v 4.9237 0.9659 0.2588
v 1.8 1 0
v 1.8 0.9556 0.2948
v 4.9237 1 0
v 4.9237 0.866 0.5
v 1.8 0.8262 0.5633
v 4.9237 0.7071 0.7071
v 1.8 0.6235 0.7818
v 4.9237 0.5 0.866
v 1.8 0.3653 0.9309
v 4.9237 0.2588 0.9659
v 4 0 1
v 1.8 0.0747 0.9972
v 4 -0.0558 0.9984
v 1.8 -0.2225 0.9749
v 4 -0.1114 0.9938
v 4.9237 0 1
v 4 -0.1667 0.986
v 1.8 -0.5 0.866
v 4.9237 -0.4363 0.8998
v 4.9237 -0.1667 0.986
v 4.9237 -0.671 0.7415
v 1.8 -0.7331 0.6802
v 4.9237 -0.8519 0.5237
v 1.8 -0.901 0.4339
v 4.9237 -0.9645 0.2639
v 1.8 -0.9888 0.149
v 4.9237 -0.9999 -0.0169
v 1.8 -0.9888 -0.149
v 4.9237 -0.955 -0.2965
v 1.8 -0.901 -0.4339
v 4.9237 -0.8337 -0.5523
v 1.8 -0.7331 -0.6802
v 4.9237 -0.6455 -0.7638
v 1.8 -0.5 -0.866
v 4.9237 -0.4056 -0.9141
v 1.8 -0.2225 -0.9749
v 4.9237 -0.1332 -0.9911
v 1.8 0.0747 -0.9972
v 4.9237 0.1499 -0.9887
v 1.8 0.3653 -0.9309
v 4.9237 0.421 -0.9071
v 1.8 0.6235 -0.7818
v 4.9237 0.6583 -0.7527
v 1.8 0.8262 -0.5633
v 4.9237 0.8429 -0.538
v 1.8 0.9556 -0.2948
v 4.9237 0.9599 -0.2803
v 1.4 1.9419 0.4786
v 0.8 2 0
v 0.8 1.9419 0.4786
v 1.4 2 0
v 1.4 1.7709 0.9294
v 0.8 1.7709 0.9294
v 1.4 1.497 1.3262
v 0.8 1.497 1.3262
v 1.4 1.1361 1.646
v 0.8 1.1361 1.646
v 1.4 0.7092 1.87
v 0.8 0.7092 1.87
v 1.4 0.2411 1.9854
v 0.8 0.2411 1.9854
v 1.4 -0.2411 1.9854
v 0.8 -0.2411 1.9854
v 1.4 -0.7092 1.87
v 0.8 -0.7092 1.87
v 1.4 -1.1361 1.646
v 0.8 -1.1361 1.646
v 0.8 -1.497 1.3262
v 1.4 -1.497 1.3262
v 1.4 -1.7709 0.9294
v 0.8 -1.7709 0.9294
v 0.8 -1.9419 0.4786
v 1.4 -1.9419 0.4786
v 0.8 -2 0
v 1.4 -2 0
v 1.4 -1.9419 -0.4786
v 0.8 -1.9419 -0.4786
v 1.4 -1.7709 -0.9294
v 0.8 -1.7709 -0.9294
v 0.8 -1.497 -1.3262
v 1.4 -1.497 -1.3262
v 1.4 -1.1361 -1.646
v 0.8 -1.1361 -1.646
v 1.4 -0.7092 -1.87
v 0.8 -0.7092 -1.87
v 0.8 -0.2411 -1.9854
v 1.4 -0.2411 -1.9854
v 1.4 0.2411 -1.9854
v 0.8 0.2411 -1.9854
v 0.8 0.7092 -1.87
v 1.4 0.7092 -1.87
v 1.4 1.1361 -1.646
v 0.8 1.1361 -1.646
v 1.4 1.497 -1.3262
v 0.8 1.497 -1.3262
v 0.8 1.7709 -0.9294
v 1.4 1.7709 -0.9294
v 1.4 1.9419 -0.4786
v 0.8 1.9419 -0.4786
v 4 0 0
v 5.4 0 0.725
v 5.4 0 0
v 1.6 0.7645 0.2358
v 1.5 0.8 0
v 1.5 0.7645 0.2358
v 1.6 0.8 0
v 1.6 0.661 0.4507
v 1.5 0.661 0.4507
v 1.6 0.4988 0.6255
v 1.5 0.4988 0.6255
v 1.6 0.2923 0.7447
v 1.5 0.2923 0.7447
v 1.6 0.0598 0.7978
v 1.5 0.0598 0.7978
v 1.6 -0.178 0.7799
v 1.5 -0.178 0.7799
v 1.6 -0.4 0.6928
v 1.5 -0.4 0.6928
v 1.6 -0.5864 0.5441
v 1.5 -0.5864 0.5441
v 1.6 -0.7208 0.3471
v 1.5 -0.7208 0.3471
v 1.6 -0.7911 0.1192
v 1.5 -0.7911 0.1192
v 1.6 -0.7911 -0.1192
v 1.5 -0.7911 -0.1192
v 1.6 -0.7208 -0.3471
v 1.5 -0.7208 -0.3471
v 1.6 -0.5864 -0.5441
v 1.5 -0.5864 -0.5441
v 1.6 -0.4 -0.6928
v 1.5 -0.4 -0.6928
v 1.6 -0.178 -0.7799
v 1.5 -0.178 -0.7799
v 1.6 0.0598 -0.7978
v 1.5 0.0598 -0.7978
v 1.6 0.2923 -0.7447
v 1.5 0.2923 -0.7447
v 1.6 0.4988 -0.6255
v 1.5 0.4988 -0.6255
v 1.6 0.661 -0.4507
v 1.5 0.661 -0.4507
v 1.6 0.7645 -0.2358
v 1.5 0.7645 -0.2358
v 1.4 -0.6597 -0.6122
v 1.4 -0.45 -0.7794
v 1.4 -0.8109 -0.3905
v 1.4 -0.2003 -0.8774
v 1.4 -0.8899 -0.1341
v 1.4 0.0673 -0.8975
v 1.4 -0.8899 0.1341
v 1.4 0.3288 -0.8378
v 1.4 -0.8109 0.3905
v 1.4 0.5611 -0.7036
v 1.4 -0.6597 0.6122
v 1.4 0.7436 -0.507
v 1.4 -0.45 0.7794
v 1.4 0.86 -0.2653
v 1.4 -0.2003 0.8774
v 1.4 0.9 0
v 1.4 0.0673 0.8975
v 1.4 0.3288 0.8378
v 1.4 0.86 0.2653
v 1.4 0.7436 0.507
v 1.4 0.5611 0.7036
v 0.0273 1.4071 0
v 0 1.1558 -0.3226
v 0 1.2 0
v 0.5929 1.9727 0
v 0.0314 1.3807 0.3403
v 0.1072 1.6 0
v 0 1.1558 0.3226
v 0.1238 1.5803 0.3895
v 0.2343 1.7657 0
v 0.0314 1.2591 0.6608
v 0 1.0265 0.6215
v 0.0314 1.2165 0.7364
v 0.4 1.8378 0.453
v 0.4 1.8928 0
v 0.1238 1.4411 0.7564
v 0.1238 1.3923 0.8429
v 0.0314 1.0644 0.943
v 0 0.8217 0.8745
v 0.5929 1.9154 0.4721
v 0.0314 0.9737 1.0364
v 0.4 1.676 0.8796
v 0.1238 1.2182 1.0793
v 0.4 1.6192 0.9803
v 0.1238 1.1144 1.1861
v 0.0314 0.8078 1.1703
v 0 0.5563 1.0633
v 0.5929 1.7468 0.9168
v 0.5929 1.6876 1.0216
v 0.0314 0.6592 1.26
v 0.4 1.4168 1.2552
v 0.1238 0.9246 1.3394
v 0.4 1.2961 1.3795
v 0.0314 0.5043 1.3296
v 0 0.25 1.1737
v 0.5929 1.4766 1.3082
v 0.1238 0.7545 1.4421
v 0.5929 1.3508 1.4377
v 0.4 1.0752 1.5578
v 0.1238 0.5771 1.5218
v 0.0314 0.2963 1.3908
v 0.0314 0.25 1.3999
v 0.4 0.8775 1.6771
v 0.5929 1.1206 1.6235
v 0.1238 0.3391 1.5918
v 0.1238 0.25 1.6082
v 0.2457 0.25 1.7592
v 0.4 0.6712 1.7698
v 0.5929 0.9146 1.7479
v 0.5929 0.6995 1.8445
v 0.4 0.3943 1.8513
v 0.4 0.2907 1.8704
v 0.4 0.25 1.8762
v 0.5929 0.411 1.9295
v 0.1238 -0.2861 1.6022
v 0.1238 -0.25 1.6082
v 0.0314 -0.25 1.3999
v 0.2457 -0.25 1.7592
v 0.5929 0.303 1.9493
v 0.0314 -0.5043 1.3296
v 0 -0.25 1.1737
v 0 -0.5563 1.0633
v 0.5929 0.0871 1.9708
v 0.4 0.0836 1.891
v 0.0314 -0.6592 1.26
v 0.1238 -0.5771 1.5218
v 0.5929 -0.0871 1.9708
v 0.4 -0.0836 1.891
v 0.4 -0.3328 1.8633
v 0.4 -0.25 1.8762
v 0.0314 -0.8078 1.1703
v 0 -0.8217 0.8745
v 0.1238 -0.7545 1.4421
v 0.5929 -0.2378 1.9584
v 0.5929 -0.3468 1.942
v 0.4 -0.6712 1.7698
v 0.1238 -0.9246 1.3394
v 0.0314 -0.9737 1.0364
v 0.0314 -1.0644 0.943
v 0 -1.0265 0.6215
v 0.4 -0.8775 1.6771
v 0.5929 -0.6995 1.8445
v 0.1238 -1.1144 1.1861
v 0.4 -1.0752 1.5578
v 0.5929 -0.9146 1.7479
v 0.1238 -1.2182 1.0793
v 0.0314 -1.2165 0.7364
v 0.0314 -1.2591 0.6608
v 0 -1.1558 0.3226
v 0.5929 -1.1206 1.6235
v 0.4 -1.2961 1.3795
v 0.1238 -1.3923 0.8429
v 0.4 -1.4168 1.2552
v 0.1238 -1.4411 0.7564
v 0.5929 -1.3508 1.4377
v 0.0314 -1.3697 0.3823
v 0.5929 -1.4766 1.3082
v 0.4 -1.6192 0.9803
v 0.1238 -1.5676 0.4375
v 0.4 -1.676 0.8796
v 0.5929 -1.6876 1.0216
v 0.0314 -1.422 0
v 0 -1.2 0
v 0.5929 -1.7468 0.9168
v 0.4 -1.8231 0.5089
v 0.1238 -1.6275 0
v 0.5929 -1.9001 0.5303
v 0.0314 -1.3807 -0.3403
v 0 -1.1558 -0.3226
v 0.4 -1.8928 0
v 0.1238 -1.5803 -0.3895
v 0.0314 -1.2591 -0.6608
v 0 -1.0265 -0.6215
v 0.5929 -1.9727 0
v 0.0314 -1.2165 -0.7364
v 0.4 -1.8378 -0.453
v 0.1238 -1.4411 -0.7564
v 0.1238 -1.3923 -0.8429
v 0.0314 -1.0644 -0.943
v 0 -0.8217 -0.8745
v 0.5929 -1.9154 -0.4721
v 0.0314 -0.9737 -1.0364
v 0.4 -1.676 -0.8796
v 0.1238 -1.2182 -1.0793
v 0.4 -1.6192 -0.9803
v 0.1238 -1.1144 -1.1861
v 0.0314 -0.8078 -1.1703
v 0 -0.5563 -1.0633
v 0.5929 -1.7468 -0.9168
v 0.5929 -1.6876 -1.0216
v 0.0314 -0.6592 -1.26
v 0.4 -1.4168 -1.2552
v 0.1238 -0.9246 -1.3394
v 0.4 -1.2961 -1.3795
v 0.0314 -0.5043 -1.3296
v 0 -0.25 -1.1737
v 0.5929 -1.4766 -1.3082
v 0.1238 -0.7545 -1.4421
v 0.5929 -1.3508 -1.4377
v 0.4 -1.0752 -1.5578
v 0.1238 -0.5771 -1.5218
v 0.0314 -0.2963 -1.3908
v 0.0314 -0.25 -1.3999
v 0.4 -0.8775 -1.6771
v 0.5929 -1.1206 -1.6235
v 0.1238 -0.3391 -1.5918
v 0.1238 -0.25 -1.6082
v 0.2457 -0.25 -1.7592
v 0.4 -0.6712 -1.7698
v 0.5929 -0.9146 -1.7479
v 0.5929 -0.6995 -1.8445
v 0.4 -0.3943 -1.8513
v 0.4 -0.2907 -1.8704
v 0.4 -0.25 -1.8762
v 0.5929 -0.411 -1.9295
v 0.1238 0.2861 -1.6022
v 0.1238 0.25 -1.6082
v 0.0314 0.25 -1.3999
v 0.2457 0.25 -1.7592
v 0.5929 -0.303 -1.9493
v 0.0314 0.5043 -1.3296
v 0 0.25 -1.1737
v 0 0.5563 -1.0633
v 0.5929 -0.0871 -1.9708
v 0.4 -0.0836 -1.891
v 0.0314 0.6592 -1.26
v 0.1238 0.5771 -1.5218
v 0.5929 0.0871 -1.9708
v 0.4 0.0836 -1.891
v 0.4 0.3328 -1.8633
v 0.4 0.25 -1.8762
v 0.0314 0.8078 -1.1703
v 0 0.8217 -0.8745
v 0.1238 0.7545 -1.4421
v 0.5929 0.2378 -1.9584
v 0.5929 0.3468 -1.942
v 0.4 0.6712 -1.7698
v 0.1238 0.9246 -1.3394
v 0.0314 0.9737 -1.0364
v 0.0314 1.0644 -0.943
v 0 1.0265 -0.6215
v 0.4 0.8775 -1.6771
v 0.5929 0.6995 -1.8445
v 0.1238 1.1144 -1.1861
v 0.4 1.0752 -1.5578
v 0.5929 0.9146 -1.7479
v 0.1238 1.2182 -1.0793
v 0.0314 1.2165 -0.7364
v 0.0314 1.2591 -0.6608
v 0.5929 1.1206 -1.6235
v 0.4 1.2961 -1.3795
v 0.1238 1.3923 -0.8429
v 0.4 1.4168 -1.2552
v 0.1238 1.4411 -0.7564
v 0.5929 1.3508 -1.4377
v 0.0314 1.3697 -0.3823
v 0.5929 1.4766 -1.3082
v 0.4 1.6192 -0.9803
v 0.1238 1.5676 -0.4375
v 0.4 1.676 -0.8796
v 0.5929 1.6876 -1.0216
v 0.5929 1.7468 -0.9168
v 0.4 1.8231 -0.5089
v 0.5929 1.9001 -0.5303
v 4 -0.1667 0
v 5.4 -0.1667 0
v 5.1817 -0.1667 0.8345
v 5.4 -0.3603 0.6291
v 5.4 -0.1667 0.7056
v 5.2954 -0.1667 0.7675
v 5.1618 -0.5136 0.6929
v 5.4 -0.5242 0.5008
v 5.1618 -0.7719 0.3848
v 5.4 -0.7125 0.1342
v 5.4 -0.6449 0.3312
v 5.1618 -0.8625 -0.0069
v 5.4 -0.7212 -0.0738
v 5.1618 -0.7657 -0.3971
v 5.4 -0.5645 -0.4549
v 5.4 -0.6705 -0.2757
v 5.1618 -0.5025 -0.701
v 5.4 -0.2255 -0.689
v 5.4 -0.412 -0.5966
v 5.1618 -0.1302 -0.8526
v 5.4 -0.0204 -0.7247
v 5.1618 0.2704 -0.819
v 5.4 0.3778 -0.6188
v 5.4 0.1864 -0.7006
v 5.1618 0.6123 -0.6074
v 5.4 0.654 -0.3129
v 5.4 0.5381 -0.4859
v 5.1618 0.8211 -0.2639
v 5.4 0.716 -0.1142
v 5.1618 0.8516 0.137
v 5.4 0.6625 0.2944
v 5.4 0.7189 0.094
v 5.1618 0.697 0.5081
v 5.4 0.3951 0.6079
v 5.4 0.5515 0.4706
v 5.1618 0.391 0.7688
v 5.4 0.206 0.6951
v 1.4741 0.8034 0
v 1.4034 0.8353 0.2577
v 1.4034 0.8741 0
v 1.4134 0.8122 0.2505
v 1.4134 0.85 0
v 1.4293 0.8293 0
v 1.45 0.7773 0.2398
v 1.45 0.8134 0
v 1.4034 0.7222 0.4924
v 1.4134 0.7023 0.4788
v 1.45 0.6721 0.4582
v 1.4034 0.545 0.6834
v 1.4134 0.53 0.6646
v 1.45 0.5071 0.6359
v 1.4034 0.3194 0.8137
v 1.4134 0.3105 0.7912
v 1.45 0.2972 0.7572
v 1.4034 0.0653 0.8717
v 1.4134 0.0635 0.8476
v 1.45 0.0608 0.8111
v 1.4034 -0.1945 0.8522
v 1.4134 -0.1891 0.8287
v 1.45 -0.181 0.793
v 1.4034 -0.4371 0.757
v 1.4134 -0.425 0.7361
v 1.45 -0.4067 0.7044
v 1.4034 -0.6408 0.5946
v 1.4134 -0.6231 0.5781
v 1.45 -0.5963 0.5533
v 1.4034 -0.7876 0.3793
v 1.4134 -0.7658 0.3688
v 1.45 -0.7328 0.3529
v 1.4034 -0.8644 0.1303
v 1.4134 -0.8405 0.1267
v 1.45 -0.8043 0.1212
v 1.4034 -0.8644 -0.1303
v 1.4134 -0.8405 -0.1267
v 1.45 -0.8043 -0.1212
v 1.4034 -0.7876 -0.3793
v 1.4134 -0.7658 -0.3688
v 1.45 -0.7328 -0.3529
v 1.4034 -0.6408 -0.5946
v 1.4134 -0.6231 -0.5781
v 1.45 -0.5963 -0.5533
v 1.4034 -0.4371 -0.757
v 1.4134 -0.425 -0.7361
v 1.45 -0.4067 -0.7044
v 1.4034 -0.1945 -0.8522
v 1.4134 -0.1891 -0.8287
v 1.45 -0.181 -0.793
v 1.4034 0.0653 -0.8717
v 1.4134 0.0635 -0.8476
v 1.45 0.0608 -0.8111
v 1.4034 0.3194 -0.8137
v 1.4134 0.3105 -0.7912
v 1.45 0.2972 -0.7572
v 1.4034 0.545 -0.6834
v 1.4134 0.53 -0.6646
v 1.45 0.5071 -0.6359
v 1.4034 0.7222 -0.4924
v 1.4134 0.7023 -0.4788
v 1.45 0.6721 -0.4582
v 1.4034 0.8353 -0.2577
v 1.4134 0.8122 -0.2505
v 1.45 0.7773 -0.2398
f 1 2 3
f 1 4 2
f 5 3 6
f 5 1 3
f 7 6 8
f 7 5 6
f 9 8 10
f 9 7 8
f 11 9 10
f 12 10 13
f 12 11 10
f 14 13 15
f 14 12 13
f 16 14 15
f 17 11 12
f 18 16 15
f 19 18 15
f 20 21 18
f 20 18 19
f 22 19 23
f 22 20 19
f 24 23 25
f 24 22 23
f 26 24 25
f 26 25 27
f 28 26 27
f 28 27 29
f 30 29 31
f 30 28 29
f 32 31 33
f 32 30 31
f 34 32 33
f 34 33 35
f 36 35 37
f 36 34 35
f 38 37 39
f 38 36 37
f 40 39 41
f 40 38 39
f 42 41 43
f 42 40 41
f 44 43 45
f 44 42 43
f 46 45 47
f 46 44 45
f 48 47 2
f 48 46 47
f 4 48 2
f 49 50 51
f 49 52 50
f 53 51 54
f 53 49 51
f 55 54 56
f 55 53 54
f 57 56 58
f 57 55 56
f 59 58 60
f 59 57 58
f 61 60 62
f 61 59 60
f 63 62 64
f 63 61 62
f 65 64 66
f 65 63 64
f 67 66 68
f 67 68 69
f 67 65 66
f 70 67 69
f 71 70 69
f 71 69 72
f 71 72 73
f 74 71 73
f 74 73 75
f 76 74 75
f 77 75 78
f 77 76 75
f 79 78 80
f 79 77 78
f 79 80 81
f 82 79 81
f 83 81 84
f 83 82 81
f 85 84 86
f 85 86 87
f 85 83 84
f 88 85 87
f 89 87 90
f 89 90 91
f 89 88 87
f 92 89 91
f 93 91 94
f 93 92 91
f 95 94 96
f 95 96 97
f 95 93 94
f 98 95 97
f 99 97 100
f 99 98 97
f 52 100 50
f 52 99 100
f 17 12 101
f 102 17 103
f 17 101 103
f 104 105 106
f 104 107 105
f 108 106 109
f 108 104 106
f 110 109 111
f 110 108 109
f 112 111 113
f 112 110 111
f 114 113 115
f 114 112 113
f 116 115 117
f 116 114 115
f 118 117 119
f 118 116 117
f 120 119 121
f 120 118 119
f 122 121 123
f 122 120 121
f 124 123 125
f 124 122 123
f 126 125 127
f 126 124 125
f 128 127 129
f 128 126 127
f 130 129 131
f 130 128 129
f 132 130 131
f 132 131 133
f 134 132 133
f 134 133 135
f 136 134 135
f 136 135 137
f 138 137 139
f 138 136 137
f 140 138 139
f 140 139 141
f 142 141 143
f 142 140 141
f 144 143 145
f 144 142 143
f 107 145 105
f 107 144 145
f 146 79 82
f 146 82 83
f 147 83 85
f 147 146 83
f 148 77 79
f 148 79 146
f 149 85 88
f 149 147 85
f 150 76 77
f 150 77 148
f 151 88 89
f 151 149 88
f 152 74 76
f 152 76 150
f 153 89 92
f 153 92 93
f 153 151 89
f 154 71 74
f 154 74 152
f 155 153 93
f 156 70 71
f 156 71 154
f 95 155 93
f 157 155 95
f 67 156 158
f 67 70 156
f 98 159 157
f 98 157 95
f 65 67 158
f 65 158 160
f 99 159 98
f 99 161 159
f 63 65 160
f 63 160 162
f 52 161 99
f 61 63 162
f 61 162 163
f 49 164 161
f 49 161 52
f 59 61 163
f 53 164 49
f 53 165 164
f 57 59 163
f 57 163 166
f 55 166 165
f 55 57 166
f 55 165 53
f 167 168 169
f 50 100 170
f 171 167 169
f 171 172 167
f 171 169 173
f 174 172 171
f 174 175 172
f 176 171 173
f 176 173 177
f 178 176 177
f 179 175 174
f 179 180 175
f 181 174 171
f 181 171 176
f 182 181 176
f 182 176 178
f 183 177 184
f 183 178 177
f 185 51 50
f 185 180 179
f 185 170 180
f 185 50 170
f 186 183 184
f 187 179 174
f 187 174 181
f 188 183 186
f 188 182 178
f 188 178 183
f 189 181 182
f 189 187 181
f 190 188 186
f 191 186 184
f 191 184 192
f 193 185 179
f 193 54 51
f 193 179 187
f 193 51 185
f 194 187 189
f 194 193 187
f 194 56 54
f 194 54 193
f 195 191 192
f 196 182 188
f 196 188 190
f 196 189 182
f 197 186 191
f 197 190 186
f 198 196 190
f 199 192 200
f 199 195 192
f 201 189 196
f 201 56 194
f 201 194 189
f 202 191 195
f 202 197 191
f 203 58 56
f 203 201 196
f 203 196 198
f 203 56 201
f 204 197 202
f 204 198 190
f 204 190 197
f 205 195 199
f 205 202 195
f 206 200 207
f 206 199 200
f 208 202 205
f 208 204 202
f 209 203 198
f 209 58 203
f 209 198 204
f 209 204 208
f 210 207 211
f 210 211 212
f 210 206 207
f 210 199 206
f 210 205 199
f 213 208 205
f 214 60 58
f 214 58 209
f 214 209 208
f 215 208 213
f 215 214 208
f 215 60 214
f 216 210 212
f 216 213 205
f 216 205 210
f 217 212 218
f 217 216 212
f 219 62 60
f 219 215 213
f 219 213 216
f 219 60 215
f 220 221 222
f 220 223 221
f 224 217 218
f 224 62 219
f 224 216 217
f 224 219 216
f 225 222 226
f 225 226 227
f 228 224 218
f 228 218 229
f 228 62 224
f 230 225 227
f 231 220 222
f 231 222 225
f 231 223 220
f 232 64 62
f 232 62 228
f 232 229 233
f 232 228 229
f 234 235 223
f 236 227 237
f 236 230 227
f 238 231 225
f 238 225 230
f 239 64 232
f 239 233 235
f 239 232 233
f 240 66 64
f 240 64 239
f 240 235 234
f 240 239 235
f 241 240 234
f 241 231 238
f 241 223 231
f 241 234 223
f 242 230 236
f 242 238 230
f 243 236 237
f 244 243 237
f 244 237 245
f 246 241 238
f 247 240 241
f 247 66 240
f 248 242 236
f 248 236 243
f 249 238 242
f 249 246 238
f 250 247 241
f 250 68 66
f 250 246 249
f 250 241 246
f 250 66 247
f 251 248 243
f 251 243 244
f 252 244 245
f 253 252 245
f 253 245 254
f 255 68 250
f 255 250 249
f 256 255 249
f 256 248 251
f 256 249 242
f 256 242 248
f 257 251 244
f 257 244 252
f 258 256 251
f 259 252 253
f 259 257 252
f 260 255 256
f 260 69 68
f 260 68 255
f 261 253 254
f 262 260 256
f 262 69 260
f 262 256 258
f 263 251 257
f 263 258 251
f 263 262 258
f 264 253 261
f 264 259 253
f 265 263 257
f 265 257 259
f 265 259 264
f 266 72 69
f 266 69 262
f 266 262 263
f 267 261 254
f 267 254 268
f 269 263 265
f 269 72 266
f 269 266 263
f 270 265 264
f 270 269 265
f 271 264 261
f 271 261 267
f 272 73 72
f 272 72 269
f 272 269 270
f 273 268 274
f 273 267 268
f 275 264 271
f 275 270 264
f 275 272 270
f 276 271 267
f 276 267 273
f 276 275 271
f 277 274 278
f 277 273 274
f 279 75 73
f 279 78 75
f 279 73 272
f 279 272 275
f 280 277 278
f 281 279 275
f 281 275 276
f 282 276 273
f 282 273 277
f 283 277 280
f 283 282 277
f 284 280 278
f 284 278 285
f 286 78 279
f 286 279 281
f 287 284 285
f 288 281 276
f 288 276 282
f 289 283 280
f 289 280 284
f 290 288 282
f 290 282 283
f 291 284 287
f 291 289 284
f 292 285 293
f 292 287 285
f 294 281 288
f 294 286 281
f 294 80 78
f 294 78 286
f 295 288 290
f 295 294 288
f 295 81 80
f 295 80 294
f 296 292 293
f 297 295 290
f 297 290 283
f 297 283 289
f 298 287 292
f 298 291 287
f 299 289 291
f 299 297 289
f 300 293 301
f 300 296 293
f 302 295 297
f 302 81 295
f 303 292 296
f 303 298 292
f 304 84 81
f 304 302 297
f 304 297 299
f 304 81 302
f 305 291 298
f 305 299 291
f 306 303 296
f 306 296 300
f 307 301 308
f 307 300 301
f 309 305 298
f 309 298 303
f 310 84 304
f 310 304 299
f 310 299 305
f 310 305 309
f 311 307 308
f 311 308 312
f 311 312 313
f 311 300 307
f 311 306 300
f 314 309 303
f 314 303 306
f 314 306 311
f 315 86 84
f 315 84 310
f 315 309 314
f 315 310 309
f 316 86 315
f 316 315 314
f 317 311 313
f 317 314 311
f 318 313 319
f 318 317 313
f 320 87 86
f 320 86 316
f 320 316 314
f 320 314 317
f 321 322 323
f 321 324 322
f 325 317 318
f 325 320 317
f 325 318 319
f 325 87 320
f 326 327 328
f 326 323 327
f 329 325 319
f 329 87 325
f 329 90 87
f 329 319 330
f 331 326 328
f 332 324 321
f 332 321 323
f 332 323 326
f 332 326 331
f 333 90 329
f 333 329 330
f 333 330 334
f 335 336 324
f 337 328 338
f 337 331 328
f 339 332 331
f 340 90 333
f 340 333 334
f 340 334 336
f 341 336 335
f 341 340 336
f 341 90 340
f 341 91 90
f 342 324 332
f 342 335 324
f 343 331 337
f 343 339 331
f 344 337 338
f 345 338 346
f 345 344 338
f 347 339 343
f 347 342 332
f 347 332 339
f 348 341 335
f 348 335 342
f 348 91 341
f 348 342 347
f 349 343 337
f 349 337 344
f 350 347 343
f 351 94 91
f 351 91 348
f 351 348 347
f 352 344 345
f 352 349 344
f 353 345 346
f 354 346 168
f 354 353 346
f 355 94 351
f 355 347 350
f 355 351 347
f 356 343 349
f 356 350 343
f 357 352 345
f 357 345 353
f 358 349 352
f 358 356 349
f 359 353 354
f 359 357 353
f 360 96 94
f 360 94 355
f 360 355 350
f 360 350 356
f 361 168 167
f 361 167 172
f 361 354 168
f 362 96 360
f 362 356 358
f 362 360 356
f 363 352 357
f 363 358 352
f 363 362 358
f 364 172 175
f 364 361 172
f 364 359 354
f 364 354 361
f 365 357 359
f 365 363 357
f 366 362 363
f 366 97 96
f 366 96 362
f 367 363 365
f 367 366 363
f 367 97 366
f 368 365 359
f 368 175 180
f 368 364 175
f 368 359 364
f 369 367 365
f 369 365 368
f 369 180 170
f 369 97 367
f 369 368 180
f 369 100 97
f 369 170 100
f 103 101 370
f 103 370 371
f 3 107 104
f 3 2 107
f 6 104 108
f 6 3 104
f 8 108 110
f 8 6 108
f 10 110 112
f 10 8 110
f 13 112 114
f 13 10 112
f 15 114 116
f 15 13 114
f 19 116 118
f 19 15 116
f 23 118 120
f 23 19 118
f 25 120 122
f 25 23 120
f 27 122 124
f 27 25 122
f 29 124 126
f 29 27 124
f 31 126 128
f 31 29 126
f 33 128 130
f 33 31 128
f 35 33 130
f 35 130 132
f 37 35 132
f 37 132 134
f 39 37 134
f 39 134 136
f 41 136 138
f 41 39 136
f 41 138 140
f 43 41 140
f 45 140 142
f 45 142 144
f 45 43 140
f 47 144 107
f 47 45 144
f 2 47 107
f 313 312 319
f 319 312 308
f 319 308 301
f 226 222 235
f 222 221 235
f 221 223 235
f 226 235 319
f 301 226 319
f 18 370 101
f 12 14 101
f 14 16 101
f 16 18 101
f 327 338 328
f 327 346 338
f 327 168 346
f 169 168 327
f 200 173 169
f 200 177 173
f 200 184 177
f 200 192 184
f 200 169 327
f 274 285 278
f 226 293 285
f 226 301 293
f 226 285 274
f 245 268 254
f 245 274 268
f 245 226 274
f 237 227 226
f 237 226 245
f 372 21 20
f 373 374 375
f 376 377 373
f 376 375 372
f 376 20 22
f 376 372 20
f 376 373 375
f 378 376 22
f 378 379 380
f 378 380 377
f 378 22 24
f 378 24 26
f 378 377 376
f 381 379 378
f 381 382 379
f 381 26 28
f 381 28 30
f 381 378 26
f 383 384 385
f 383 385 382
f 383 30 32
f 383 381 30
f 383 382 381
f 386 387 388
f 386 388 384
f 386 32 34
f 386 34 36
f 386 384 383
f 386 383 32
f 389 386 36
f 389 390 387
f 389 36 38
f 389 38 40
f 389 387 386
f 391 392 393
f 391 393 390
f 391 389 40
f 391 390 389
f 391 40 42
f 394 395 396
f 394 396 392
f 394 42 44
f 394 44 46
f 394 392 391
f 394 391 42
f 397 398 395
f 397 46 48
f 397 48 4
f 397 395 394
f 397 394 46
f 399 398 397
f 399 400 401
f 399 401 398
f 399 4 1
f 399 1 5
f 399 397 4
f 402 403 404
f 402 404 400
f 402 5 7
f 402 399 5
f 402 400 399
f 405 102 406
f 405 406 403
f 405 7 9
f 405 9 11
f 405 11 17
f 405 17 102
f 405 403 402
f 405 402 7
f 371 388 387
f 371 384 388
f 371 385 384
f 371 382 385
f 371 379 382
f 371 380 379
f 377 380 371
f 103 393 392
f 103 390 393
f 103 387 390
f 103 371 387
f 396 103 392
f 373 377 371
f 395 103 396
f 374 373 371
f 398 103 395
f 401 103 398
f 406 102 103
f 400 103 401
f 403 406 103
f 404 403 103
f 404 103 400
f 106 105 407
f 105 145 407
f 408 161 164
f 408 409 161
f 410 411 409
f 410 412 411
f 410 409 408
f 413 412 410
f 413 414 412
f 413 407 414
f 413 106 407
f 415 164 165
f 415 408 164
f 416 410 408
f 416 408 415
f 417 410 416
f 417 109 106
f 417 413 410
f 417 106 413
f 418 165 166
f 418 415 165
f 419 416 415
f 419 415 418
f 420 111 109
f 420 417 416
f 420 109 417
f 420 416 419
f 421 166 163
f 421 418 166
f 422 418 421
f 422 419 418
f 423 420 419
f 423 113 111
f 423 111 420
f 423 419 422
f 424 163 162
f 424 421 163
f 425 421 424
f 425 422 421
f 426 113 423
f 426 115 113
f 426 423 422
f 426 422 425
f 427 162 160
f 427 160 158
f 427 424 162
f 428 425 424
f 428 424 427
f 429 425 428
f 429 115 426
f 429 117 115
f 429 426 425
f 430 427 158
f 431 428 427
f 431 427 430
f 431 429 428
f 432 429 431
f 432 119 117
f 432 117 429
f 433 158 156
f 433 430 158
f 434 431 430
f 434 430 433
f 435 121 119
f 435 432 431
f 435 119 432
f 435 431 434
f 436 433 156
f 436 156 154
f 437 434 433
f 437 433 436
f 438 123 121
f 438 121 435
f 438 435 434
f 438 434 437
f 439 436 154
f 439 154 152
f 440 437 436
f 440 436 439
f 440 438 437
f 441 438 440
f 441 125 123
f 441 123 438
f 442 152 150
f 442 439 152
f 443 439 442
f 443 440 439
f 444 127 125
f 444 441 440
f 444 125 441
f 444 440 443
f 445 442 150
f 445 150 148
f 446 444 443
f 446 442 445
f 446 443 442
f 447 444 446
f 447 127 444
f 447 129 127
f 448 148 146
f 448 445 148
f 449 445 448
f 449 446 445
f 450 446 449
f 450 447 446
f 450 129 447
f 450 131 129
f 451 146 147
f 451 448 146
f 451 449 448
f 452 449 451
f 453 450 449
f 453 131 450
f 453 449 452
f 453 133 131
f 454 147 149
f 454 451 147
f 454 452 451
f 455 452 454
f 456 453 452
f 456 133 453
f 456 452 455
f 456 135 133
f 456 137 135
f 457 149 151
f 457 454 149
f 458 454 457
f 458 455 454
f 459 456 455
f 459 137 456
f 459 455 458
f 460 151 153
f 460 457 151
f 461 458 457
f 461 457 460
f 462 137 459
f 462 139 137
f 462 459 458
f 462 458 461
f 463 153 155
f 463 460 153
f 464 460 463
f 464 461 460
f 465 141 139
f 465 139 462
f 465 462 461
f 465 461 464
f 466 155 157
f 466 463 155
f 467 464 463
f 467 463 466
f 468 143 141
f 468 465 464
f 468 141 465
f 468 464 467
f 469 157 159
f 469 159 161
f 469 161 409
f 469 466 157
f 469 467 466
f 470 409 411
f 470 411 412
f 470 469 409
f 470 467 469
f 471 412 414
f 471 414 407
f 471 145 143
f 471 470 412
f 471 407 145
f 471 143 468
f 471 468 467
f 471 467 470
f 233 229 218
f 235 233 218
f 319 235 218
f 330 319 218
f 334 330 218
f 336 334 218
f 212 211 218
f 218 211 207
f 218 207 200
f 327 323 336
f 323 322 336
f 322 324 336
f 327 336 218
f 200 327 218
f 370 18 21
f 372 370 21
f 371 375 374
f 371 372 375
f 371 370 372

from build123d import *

# Parameters (mm, degrees)
SKETCH2_W                    = 0.4
SKETCH2_H                    = 0.5
SLOT_CUT_EXTRUDE1_DEPTH      = 3
SLOT_CUT_EXTRUDE1_DEPTH_BACK = 3
SKETCH11_W                   = 1.4
SKETCH11_H                   = 0.166666667
POINT_CUT_EXTRUDE8_DEPTH     = 3.0000001


with BuildPart() as part:
    # Sketch1 → base-Revolve (revolve)
    with BuildSketch(Plane.XY):
        with BuildLine():
            Line((0, 0), (0, 1.2))
            ThreePointArc((0, 1.2), (0.234314575, 1.765685425), (0.8, 2))
            Line((0.8, 2), (1.4, 2))
            Line((1.4, 2), (1.4, 0.9))
            ThreePointArc((1.4, 0.9), (1.429289322, 0.829289322), (1.5, 0.8))
            Line((1.5, 0.8), (1.6, 0.8))
            Line((1.6, 0.8), (1.8, 1))
            Line((1.8, 1), (5.4, 1))
            Line((5.4, 1), (5.4, 0))
            Line((5.4, 0), (0, 0))
        make_face()
    revolve(axis=Axis((0, 0, 0), (1, 0, 0)))

    # Sketch2 → slot_Cut-Extrude1 (cut, two sides)
    with BuildSketch(Plane.XY) as slot_cut_extrude1_sk:
        with Locations((0.2, 0)):
            Rectangle(SKETCH2_W, SKETCH2_H)
    extrude(amount=SLOT_CUT_EXTRUDE1_DEPTH, mode=Mode.SUBTRACT)
    extrude(slot_cut_extrude1_sk.sketch, amount=-SLOT_CUT_EXTRUDE1_DEPTH_BACK, mode=Mode.SUBTRACT)

    # Sketch8 → point_Cut-Revolve1 (revolve, cut)
    with BuildSketch(Plane.XY):
        Polygon((5.4, 0), (5.908, 0), (5.908, 1.508), (4.923686028, 1.508), (4.923686028, 1), (5.4, 0.725), align=None)
    revolve(axis=Axis((0, 0, 0), (1, 0, 0)), mode=Mode.SUBTRACT)

    # Sketch11 → point_Cut-Extrude8 (cut, through all)
    with BuildSketch(Plane.XY):
        with Locations((4.7, -0.083333334)):
            Rectangle(SKETCH11_W, SKETCH11_H)
    extrude(amount=POINT_CUT_EXTRUDE8_DEPTH, mode=Mode.SUBTRACT)


solid = part.part
